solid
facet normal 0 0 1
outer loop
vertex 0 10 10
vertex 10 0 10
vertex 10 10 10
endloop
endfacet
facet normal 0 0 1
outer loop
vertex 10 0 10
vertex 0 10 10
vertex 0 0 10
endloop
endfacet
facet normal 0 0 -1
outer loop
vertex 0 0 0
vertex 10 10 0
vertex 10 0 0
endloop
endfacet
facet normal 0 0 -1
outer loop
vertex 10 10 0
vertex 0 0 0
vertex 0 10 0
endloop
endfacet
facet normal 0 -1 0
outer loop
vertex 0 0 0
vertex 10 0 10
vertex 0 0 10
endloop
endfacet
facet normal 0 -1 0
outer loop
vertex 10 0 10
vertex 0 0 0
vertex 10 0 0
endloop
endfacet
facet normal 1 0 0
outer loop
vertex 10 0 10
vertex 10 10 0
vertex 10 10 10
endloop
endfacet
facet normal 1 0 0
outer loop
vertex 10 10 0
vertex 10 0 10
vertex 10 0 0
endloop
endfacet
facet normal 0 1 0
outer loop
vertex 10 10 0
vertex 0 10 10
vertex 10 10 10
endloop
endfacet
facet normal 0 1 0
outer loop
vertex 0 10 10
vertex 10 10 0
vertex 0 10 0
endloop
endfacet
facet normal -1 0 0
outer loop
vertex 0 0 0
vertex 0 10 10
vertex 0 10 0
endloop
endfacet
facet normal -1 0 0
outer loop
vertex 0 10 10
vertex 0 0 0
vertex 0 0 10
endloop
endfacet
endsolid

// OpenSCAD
//testing github functions with one script that just creates a cube

cube(10);
circle(5);
